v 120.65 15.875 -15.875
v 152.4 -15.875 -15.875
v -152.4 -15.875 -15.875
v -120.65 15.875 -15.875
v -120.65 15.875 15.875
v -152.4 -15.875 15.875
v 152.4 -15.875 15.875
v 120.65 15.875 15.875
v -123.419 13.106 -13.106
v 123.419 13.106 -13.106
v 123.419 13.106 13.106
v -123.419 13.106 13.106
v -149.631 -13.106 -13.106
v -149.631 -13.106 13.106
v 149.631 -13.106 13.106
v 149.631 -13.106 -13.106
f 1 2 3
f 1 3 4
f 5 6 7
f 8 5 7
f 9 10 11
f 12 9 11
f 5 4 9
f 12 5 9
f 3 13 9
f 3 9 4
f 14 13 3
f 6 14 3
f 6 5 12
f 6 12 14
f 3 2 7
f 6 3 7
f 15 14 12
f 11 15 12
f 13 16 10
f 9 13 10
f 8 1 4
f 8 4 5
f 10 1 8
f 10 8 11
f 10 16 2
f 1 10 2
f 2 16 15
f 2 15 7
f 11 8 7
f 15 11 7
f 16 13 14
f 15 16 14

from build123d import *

# Parameters (mm, degrees)
SKETCH_W       = 31.75
SKETCH_H       = 31.75
SKETCH_W_2     = 26.2128
SKETCH_H_2     = 26.2128
PAD_DEPTH      = 152.4
PAD_DEPTH_BACK = 152.4
POCKET_DEPTH   = 31.75


with BuildPart() as part:
    # Sketch → Pad (new body, two sides)
    with BuildSketch(Plane.YZ) as pad_sk:
        Rectangle(SKETCH_W, SKETCH_H)
        Rectangle(SKETCH_W_2, SKETCH_H_2, mode=Mode.SUBTRACT)
    extrude(amount=PAD_DEPTH)
    extrude(pad_sk.sketch, amount=-PAD_DEPTH_BACK)

    # Sketch001 → Pocket (cut)
    with BuildSketch(Plane(origin=(0, 0, 15.875), x_dir=(0, -1, 0), z_dir=(0, 0, 1))):
        Polygon((15.875, 152.4), (-15.875, 152.4), (-15.875, 120.65), align=None)
    pocket = extrude(amount=-POCKET_DEPTH, mode=Mode.SUBTRACT)

    # Mirrored: Pocket across Sketch001 H_Axis
    add(pocket.mirror(Plane(origin=(0, 0, 15.875), x_dir=(0, 0, 1), z_dir=(1, 0, 0))), mode=Mode.SUBTRACT)


solid = part.part
